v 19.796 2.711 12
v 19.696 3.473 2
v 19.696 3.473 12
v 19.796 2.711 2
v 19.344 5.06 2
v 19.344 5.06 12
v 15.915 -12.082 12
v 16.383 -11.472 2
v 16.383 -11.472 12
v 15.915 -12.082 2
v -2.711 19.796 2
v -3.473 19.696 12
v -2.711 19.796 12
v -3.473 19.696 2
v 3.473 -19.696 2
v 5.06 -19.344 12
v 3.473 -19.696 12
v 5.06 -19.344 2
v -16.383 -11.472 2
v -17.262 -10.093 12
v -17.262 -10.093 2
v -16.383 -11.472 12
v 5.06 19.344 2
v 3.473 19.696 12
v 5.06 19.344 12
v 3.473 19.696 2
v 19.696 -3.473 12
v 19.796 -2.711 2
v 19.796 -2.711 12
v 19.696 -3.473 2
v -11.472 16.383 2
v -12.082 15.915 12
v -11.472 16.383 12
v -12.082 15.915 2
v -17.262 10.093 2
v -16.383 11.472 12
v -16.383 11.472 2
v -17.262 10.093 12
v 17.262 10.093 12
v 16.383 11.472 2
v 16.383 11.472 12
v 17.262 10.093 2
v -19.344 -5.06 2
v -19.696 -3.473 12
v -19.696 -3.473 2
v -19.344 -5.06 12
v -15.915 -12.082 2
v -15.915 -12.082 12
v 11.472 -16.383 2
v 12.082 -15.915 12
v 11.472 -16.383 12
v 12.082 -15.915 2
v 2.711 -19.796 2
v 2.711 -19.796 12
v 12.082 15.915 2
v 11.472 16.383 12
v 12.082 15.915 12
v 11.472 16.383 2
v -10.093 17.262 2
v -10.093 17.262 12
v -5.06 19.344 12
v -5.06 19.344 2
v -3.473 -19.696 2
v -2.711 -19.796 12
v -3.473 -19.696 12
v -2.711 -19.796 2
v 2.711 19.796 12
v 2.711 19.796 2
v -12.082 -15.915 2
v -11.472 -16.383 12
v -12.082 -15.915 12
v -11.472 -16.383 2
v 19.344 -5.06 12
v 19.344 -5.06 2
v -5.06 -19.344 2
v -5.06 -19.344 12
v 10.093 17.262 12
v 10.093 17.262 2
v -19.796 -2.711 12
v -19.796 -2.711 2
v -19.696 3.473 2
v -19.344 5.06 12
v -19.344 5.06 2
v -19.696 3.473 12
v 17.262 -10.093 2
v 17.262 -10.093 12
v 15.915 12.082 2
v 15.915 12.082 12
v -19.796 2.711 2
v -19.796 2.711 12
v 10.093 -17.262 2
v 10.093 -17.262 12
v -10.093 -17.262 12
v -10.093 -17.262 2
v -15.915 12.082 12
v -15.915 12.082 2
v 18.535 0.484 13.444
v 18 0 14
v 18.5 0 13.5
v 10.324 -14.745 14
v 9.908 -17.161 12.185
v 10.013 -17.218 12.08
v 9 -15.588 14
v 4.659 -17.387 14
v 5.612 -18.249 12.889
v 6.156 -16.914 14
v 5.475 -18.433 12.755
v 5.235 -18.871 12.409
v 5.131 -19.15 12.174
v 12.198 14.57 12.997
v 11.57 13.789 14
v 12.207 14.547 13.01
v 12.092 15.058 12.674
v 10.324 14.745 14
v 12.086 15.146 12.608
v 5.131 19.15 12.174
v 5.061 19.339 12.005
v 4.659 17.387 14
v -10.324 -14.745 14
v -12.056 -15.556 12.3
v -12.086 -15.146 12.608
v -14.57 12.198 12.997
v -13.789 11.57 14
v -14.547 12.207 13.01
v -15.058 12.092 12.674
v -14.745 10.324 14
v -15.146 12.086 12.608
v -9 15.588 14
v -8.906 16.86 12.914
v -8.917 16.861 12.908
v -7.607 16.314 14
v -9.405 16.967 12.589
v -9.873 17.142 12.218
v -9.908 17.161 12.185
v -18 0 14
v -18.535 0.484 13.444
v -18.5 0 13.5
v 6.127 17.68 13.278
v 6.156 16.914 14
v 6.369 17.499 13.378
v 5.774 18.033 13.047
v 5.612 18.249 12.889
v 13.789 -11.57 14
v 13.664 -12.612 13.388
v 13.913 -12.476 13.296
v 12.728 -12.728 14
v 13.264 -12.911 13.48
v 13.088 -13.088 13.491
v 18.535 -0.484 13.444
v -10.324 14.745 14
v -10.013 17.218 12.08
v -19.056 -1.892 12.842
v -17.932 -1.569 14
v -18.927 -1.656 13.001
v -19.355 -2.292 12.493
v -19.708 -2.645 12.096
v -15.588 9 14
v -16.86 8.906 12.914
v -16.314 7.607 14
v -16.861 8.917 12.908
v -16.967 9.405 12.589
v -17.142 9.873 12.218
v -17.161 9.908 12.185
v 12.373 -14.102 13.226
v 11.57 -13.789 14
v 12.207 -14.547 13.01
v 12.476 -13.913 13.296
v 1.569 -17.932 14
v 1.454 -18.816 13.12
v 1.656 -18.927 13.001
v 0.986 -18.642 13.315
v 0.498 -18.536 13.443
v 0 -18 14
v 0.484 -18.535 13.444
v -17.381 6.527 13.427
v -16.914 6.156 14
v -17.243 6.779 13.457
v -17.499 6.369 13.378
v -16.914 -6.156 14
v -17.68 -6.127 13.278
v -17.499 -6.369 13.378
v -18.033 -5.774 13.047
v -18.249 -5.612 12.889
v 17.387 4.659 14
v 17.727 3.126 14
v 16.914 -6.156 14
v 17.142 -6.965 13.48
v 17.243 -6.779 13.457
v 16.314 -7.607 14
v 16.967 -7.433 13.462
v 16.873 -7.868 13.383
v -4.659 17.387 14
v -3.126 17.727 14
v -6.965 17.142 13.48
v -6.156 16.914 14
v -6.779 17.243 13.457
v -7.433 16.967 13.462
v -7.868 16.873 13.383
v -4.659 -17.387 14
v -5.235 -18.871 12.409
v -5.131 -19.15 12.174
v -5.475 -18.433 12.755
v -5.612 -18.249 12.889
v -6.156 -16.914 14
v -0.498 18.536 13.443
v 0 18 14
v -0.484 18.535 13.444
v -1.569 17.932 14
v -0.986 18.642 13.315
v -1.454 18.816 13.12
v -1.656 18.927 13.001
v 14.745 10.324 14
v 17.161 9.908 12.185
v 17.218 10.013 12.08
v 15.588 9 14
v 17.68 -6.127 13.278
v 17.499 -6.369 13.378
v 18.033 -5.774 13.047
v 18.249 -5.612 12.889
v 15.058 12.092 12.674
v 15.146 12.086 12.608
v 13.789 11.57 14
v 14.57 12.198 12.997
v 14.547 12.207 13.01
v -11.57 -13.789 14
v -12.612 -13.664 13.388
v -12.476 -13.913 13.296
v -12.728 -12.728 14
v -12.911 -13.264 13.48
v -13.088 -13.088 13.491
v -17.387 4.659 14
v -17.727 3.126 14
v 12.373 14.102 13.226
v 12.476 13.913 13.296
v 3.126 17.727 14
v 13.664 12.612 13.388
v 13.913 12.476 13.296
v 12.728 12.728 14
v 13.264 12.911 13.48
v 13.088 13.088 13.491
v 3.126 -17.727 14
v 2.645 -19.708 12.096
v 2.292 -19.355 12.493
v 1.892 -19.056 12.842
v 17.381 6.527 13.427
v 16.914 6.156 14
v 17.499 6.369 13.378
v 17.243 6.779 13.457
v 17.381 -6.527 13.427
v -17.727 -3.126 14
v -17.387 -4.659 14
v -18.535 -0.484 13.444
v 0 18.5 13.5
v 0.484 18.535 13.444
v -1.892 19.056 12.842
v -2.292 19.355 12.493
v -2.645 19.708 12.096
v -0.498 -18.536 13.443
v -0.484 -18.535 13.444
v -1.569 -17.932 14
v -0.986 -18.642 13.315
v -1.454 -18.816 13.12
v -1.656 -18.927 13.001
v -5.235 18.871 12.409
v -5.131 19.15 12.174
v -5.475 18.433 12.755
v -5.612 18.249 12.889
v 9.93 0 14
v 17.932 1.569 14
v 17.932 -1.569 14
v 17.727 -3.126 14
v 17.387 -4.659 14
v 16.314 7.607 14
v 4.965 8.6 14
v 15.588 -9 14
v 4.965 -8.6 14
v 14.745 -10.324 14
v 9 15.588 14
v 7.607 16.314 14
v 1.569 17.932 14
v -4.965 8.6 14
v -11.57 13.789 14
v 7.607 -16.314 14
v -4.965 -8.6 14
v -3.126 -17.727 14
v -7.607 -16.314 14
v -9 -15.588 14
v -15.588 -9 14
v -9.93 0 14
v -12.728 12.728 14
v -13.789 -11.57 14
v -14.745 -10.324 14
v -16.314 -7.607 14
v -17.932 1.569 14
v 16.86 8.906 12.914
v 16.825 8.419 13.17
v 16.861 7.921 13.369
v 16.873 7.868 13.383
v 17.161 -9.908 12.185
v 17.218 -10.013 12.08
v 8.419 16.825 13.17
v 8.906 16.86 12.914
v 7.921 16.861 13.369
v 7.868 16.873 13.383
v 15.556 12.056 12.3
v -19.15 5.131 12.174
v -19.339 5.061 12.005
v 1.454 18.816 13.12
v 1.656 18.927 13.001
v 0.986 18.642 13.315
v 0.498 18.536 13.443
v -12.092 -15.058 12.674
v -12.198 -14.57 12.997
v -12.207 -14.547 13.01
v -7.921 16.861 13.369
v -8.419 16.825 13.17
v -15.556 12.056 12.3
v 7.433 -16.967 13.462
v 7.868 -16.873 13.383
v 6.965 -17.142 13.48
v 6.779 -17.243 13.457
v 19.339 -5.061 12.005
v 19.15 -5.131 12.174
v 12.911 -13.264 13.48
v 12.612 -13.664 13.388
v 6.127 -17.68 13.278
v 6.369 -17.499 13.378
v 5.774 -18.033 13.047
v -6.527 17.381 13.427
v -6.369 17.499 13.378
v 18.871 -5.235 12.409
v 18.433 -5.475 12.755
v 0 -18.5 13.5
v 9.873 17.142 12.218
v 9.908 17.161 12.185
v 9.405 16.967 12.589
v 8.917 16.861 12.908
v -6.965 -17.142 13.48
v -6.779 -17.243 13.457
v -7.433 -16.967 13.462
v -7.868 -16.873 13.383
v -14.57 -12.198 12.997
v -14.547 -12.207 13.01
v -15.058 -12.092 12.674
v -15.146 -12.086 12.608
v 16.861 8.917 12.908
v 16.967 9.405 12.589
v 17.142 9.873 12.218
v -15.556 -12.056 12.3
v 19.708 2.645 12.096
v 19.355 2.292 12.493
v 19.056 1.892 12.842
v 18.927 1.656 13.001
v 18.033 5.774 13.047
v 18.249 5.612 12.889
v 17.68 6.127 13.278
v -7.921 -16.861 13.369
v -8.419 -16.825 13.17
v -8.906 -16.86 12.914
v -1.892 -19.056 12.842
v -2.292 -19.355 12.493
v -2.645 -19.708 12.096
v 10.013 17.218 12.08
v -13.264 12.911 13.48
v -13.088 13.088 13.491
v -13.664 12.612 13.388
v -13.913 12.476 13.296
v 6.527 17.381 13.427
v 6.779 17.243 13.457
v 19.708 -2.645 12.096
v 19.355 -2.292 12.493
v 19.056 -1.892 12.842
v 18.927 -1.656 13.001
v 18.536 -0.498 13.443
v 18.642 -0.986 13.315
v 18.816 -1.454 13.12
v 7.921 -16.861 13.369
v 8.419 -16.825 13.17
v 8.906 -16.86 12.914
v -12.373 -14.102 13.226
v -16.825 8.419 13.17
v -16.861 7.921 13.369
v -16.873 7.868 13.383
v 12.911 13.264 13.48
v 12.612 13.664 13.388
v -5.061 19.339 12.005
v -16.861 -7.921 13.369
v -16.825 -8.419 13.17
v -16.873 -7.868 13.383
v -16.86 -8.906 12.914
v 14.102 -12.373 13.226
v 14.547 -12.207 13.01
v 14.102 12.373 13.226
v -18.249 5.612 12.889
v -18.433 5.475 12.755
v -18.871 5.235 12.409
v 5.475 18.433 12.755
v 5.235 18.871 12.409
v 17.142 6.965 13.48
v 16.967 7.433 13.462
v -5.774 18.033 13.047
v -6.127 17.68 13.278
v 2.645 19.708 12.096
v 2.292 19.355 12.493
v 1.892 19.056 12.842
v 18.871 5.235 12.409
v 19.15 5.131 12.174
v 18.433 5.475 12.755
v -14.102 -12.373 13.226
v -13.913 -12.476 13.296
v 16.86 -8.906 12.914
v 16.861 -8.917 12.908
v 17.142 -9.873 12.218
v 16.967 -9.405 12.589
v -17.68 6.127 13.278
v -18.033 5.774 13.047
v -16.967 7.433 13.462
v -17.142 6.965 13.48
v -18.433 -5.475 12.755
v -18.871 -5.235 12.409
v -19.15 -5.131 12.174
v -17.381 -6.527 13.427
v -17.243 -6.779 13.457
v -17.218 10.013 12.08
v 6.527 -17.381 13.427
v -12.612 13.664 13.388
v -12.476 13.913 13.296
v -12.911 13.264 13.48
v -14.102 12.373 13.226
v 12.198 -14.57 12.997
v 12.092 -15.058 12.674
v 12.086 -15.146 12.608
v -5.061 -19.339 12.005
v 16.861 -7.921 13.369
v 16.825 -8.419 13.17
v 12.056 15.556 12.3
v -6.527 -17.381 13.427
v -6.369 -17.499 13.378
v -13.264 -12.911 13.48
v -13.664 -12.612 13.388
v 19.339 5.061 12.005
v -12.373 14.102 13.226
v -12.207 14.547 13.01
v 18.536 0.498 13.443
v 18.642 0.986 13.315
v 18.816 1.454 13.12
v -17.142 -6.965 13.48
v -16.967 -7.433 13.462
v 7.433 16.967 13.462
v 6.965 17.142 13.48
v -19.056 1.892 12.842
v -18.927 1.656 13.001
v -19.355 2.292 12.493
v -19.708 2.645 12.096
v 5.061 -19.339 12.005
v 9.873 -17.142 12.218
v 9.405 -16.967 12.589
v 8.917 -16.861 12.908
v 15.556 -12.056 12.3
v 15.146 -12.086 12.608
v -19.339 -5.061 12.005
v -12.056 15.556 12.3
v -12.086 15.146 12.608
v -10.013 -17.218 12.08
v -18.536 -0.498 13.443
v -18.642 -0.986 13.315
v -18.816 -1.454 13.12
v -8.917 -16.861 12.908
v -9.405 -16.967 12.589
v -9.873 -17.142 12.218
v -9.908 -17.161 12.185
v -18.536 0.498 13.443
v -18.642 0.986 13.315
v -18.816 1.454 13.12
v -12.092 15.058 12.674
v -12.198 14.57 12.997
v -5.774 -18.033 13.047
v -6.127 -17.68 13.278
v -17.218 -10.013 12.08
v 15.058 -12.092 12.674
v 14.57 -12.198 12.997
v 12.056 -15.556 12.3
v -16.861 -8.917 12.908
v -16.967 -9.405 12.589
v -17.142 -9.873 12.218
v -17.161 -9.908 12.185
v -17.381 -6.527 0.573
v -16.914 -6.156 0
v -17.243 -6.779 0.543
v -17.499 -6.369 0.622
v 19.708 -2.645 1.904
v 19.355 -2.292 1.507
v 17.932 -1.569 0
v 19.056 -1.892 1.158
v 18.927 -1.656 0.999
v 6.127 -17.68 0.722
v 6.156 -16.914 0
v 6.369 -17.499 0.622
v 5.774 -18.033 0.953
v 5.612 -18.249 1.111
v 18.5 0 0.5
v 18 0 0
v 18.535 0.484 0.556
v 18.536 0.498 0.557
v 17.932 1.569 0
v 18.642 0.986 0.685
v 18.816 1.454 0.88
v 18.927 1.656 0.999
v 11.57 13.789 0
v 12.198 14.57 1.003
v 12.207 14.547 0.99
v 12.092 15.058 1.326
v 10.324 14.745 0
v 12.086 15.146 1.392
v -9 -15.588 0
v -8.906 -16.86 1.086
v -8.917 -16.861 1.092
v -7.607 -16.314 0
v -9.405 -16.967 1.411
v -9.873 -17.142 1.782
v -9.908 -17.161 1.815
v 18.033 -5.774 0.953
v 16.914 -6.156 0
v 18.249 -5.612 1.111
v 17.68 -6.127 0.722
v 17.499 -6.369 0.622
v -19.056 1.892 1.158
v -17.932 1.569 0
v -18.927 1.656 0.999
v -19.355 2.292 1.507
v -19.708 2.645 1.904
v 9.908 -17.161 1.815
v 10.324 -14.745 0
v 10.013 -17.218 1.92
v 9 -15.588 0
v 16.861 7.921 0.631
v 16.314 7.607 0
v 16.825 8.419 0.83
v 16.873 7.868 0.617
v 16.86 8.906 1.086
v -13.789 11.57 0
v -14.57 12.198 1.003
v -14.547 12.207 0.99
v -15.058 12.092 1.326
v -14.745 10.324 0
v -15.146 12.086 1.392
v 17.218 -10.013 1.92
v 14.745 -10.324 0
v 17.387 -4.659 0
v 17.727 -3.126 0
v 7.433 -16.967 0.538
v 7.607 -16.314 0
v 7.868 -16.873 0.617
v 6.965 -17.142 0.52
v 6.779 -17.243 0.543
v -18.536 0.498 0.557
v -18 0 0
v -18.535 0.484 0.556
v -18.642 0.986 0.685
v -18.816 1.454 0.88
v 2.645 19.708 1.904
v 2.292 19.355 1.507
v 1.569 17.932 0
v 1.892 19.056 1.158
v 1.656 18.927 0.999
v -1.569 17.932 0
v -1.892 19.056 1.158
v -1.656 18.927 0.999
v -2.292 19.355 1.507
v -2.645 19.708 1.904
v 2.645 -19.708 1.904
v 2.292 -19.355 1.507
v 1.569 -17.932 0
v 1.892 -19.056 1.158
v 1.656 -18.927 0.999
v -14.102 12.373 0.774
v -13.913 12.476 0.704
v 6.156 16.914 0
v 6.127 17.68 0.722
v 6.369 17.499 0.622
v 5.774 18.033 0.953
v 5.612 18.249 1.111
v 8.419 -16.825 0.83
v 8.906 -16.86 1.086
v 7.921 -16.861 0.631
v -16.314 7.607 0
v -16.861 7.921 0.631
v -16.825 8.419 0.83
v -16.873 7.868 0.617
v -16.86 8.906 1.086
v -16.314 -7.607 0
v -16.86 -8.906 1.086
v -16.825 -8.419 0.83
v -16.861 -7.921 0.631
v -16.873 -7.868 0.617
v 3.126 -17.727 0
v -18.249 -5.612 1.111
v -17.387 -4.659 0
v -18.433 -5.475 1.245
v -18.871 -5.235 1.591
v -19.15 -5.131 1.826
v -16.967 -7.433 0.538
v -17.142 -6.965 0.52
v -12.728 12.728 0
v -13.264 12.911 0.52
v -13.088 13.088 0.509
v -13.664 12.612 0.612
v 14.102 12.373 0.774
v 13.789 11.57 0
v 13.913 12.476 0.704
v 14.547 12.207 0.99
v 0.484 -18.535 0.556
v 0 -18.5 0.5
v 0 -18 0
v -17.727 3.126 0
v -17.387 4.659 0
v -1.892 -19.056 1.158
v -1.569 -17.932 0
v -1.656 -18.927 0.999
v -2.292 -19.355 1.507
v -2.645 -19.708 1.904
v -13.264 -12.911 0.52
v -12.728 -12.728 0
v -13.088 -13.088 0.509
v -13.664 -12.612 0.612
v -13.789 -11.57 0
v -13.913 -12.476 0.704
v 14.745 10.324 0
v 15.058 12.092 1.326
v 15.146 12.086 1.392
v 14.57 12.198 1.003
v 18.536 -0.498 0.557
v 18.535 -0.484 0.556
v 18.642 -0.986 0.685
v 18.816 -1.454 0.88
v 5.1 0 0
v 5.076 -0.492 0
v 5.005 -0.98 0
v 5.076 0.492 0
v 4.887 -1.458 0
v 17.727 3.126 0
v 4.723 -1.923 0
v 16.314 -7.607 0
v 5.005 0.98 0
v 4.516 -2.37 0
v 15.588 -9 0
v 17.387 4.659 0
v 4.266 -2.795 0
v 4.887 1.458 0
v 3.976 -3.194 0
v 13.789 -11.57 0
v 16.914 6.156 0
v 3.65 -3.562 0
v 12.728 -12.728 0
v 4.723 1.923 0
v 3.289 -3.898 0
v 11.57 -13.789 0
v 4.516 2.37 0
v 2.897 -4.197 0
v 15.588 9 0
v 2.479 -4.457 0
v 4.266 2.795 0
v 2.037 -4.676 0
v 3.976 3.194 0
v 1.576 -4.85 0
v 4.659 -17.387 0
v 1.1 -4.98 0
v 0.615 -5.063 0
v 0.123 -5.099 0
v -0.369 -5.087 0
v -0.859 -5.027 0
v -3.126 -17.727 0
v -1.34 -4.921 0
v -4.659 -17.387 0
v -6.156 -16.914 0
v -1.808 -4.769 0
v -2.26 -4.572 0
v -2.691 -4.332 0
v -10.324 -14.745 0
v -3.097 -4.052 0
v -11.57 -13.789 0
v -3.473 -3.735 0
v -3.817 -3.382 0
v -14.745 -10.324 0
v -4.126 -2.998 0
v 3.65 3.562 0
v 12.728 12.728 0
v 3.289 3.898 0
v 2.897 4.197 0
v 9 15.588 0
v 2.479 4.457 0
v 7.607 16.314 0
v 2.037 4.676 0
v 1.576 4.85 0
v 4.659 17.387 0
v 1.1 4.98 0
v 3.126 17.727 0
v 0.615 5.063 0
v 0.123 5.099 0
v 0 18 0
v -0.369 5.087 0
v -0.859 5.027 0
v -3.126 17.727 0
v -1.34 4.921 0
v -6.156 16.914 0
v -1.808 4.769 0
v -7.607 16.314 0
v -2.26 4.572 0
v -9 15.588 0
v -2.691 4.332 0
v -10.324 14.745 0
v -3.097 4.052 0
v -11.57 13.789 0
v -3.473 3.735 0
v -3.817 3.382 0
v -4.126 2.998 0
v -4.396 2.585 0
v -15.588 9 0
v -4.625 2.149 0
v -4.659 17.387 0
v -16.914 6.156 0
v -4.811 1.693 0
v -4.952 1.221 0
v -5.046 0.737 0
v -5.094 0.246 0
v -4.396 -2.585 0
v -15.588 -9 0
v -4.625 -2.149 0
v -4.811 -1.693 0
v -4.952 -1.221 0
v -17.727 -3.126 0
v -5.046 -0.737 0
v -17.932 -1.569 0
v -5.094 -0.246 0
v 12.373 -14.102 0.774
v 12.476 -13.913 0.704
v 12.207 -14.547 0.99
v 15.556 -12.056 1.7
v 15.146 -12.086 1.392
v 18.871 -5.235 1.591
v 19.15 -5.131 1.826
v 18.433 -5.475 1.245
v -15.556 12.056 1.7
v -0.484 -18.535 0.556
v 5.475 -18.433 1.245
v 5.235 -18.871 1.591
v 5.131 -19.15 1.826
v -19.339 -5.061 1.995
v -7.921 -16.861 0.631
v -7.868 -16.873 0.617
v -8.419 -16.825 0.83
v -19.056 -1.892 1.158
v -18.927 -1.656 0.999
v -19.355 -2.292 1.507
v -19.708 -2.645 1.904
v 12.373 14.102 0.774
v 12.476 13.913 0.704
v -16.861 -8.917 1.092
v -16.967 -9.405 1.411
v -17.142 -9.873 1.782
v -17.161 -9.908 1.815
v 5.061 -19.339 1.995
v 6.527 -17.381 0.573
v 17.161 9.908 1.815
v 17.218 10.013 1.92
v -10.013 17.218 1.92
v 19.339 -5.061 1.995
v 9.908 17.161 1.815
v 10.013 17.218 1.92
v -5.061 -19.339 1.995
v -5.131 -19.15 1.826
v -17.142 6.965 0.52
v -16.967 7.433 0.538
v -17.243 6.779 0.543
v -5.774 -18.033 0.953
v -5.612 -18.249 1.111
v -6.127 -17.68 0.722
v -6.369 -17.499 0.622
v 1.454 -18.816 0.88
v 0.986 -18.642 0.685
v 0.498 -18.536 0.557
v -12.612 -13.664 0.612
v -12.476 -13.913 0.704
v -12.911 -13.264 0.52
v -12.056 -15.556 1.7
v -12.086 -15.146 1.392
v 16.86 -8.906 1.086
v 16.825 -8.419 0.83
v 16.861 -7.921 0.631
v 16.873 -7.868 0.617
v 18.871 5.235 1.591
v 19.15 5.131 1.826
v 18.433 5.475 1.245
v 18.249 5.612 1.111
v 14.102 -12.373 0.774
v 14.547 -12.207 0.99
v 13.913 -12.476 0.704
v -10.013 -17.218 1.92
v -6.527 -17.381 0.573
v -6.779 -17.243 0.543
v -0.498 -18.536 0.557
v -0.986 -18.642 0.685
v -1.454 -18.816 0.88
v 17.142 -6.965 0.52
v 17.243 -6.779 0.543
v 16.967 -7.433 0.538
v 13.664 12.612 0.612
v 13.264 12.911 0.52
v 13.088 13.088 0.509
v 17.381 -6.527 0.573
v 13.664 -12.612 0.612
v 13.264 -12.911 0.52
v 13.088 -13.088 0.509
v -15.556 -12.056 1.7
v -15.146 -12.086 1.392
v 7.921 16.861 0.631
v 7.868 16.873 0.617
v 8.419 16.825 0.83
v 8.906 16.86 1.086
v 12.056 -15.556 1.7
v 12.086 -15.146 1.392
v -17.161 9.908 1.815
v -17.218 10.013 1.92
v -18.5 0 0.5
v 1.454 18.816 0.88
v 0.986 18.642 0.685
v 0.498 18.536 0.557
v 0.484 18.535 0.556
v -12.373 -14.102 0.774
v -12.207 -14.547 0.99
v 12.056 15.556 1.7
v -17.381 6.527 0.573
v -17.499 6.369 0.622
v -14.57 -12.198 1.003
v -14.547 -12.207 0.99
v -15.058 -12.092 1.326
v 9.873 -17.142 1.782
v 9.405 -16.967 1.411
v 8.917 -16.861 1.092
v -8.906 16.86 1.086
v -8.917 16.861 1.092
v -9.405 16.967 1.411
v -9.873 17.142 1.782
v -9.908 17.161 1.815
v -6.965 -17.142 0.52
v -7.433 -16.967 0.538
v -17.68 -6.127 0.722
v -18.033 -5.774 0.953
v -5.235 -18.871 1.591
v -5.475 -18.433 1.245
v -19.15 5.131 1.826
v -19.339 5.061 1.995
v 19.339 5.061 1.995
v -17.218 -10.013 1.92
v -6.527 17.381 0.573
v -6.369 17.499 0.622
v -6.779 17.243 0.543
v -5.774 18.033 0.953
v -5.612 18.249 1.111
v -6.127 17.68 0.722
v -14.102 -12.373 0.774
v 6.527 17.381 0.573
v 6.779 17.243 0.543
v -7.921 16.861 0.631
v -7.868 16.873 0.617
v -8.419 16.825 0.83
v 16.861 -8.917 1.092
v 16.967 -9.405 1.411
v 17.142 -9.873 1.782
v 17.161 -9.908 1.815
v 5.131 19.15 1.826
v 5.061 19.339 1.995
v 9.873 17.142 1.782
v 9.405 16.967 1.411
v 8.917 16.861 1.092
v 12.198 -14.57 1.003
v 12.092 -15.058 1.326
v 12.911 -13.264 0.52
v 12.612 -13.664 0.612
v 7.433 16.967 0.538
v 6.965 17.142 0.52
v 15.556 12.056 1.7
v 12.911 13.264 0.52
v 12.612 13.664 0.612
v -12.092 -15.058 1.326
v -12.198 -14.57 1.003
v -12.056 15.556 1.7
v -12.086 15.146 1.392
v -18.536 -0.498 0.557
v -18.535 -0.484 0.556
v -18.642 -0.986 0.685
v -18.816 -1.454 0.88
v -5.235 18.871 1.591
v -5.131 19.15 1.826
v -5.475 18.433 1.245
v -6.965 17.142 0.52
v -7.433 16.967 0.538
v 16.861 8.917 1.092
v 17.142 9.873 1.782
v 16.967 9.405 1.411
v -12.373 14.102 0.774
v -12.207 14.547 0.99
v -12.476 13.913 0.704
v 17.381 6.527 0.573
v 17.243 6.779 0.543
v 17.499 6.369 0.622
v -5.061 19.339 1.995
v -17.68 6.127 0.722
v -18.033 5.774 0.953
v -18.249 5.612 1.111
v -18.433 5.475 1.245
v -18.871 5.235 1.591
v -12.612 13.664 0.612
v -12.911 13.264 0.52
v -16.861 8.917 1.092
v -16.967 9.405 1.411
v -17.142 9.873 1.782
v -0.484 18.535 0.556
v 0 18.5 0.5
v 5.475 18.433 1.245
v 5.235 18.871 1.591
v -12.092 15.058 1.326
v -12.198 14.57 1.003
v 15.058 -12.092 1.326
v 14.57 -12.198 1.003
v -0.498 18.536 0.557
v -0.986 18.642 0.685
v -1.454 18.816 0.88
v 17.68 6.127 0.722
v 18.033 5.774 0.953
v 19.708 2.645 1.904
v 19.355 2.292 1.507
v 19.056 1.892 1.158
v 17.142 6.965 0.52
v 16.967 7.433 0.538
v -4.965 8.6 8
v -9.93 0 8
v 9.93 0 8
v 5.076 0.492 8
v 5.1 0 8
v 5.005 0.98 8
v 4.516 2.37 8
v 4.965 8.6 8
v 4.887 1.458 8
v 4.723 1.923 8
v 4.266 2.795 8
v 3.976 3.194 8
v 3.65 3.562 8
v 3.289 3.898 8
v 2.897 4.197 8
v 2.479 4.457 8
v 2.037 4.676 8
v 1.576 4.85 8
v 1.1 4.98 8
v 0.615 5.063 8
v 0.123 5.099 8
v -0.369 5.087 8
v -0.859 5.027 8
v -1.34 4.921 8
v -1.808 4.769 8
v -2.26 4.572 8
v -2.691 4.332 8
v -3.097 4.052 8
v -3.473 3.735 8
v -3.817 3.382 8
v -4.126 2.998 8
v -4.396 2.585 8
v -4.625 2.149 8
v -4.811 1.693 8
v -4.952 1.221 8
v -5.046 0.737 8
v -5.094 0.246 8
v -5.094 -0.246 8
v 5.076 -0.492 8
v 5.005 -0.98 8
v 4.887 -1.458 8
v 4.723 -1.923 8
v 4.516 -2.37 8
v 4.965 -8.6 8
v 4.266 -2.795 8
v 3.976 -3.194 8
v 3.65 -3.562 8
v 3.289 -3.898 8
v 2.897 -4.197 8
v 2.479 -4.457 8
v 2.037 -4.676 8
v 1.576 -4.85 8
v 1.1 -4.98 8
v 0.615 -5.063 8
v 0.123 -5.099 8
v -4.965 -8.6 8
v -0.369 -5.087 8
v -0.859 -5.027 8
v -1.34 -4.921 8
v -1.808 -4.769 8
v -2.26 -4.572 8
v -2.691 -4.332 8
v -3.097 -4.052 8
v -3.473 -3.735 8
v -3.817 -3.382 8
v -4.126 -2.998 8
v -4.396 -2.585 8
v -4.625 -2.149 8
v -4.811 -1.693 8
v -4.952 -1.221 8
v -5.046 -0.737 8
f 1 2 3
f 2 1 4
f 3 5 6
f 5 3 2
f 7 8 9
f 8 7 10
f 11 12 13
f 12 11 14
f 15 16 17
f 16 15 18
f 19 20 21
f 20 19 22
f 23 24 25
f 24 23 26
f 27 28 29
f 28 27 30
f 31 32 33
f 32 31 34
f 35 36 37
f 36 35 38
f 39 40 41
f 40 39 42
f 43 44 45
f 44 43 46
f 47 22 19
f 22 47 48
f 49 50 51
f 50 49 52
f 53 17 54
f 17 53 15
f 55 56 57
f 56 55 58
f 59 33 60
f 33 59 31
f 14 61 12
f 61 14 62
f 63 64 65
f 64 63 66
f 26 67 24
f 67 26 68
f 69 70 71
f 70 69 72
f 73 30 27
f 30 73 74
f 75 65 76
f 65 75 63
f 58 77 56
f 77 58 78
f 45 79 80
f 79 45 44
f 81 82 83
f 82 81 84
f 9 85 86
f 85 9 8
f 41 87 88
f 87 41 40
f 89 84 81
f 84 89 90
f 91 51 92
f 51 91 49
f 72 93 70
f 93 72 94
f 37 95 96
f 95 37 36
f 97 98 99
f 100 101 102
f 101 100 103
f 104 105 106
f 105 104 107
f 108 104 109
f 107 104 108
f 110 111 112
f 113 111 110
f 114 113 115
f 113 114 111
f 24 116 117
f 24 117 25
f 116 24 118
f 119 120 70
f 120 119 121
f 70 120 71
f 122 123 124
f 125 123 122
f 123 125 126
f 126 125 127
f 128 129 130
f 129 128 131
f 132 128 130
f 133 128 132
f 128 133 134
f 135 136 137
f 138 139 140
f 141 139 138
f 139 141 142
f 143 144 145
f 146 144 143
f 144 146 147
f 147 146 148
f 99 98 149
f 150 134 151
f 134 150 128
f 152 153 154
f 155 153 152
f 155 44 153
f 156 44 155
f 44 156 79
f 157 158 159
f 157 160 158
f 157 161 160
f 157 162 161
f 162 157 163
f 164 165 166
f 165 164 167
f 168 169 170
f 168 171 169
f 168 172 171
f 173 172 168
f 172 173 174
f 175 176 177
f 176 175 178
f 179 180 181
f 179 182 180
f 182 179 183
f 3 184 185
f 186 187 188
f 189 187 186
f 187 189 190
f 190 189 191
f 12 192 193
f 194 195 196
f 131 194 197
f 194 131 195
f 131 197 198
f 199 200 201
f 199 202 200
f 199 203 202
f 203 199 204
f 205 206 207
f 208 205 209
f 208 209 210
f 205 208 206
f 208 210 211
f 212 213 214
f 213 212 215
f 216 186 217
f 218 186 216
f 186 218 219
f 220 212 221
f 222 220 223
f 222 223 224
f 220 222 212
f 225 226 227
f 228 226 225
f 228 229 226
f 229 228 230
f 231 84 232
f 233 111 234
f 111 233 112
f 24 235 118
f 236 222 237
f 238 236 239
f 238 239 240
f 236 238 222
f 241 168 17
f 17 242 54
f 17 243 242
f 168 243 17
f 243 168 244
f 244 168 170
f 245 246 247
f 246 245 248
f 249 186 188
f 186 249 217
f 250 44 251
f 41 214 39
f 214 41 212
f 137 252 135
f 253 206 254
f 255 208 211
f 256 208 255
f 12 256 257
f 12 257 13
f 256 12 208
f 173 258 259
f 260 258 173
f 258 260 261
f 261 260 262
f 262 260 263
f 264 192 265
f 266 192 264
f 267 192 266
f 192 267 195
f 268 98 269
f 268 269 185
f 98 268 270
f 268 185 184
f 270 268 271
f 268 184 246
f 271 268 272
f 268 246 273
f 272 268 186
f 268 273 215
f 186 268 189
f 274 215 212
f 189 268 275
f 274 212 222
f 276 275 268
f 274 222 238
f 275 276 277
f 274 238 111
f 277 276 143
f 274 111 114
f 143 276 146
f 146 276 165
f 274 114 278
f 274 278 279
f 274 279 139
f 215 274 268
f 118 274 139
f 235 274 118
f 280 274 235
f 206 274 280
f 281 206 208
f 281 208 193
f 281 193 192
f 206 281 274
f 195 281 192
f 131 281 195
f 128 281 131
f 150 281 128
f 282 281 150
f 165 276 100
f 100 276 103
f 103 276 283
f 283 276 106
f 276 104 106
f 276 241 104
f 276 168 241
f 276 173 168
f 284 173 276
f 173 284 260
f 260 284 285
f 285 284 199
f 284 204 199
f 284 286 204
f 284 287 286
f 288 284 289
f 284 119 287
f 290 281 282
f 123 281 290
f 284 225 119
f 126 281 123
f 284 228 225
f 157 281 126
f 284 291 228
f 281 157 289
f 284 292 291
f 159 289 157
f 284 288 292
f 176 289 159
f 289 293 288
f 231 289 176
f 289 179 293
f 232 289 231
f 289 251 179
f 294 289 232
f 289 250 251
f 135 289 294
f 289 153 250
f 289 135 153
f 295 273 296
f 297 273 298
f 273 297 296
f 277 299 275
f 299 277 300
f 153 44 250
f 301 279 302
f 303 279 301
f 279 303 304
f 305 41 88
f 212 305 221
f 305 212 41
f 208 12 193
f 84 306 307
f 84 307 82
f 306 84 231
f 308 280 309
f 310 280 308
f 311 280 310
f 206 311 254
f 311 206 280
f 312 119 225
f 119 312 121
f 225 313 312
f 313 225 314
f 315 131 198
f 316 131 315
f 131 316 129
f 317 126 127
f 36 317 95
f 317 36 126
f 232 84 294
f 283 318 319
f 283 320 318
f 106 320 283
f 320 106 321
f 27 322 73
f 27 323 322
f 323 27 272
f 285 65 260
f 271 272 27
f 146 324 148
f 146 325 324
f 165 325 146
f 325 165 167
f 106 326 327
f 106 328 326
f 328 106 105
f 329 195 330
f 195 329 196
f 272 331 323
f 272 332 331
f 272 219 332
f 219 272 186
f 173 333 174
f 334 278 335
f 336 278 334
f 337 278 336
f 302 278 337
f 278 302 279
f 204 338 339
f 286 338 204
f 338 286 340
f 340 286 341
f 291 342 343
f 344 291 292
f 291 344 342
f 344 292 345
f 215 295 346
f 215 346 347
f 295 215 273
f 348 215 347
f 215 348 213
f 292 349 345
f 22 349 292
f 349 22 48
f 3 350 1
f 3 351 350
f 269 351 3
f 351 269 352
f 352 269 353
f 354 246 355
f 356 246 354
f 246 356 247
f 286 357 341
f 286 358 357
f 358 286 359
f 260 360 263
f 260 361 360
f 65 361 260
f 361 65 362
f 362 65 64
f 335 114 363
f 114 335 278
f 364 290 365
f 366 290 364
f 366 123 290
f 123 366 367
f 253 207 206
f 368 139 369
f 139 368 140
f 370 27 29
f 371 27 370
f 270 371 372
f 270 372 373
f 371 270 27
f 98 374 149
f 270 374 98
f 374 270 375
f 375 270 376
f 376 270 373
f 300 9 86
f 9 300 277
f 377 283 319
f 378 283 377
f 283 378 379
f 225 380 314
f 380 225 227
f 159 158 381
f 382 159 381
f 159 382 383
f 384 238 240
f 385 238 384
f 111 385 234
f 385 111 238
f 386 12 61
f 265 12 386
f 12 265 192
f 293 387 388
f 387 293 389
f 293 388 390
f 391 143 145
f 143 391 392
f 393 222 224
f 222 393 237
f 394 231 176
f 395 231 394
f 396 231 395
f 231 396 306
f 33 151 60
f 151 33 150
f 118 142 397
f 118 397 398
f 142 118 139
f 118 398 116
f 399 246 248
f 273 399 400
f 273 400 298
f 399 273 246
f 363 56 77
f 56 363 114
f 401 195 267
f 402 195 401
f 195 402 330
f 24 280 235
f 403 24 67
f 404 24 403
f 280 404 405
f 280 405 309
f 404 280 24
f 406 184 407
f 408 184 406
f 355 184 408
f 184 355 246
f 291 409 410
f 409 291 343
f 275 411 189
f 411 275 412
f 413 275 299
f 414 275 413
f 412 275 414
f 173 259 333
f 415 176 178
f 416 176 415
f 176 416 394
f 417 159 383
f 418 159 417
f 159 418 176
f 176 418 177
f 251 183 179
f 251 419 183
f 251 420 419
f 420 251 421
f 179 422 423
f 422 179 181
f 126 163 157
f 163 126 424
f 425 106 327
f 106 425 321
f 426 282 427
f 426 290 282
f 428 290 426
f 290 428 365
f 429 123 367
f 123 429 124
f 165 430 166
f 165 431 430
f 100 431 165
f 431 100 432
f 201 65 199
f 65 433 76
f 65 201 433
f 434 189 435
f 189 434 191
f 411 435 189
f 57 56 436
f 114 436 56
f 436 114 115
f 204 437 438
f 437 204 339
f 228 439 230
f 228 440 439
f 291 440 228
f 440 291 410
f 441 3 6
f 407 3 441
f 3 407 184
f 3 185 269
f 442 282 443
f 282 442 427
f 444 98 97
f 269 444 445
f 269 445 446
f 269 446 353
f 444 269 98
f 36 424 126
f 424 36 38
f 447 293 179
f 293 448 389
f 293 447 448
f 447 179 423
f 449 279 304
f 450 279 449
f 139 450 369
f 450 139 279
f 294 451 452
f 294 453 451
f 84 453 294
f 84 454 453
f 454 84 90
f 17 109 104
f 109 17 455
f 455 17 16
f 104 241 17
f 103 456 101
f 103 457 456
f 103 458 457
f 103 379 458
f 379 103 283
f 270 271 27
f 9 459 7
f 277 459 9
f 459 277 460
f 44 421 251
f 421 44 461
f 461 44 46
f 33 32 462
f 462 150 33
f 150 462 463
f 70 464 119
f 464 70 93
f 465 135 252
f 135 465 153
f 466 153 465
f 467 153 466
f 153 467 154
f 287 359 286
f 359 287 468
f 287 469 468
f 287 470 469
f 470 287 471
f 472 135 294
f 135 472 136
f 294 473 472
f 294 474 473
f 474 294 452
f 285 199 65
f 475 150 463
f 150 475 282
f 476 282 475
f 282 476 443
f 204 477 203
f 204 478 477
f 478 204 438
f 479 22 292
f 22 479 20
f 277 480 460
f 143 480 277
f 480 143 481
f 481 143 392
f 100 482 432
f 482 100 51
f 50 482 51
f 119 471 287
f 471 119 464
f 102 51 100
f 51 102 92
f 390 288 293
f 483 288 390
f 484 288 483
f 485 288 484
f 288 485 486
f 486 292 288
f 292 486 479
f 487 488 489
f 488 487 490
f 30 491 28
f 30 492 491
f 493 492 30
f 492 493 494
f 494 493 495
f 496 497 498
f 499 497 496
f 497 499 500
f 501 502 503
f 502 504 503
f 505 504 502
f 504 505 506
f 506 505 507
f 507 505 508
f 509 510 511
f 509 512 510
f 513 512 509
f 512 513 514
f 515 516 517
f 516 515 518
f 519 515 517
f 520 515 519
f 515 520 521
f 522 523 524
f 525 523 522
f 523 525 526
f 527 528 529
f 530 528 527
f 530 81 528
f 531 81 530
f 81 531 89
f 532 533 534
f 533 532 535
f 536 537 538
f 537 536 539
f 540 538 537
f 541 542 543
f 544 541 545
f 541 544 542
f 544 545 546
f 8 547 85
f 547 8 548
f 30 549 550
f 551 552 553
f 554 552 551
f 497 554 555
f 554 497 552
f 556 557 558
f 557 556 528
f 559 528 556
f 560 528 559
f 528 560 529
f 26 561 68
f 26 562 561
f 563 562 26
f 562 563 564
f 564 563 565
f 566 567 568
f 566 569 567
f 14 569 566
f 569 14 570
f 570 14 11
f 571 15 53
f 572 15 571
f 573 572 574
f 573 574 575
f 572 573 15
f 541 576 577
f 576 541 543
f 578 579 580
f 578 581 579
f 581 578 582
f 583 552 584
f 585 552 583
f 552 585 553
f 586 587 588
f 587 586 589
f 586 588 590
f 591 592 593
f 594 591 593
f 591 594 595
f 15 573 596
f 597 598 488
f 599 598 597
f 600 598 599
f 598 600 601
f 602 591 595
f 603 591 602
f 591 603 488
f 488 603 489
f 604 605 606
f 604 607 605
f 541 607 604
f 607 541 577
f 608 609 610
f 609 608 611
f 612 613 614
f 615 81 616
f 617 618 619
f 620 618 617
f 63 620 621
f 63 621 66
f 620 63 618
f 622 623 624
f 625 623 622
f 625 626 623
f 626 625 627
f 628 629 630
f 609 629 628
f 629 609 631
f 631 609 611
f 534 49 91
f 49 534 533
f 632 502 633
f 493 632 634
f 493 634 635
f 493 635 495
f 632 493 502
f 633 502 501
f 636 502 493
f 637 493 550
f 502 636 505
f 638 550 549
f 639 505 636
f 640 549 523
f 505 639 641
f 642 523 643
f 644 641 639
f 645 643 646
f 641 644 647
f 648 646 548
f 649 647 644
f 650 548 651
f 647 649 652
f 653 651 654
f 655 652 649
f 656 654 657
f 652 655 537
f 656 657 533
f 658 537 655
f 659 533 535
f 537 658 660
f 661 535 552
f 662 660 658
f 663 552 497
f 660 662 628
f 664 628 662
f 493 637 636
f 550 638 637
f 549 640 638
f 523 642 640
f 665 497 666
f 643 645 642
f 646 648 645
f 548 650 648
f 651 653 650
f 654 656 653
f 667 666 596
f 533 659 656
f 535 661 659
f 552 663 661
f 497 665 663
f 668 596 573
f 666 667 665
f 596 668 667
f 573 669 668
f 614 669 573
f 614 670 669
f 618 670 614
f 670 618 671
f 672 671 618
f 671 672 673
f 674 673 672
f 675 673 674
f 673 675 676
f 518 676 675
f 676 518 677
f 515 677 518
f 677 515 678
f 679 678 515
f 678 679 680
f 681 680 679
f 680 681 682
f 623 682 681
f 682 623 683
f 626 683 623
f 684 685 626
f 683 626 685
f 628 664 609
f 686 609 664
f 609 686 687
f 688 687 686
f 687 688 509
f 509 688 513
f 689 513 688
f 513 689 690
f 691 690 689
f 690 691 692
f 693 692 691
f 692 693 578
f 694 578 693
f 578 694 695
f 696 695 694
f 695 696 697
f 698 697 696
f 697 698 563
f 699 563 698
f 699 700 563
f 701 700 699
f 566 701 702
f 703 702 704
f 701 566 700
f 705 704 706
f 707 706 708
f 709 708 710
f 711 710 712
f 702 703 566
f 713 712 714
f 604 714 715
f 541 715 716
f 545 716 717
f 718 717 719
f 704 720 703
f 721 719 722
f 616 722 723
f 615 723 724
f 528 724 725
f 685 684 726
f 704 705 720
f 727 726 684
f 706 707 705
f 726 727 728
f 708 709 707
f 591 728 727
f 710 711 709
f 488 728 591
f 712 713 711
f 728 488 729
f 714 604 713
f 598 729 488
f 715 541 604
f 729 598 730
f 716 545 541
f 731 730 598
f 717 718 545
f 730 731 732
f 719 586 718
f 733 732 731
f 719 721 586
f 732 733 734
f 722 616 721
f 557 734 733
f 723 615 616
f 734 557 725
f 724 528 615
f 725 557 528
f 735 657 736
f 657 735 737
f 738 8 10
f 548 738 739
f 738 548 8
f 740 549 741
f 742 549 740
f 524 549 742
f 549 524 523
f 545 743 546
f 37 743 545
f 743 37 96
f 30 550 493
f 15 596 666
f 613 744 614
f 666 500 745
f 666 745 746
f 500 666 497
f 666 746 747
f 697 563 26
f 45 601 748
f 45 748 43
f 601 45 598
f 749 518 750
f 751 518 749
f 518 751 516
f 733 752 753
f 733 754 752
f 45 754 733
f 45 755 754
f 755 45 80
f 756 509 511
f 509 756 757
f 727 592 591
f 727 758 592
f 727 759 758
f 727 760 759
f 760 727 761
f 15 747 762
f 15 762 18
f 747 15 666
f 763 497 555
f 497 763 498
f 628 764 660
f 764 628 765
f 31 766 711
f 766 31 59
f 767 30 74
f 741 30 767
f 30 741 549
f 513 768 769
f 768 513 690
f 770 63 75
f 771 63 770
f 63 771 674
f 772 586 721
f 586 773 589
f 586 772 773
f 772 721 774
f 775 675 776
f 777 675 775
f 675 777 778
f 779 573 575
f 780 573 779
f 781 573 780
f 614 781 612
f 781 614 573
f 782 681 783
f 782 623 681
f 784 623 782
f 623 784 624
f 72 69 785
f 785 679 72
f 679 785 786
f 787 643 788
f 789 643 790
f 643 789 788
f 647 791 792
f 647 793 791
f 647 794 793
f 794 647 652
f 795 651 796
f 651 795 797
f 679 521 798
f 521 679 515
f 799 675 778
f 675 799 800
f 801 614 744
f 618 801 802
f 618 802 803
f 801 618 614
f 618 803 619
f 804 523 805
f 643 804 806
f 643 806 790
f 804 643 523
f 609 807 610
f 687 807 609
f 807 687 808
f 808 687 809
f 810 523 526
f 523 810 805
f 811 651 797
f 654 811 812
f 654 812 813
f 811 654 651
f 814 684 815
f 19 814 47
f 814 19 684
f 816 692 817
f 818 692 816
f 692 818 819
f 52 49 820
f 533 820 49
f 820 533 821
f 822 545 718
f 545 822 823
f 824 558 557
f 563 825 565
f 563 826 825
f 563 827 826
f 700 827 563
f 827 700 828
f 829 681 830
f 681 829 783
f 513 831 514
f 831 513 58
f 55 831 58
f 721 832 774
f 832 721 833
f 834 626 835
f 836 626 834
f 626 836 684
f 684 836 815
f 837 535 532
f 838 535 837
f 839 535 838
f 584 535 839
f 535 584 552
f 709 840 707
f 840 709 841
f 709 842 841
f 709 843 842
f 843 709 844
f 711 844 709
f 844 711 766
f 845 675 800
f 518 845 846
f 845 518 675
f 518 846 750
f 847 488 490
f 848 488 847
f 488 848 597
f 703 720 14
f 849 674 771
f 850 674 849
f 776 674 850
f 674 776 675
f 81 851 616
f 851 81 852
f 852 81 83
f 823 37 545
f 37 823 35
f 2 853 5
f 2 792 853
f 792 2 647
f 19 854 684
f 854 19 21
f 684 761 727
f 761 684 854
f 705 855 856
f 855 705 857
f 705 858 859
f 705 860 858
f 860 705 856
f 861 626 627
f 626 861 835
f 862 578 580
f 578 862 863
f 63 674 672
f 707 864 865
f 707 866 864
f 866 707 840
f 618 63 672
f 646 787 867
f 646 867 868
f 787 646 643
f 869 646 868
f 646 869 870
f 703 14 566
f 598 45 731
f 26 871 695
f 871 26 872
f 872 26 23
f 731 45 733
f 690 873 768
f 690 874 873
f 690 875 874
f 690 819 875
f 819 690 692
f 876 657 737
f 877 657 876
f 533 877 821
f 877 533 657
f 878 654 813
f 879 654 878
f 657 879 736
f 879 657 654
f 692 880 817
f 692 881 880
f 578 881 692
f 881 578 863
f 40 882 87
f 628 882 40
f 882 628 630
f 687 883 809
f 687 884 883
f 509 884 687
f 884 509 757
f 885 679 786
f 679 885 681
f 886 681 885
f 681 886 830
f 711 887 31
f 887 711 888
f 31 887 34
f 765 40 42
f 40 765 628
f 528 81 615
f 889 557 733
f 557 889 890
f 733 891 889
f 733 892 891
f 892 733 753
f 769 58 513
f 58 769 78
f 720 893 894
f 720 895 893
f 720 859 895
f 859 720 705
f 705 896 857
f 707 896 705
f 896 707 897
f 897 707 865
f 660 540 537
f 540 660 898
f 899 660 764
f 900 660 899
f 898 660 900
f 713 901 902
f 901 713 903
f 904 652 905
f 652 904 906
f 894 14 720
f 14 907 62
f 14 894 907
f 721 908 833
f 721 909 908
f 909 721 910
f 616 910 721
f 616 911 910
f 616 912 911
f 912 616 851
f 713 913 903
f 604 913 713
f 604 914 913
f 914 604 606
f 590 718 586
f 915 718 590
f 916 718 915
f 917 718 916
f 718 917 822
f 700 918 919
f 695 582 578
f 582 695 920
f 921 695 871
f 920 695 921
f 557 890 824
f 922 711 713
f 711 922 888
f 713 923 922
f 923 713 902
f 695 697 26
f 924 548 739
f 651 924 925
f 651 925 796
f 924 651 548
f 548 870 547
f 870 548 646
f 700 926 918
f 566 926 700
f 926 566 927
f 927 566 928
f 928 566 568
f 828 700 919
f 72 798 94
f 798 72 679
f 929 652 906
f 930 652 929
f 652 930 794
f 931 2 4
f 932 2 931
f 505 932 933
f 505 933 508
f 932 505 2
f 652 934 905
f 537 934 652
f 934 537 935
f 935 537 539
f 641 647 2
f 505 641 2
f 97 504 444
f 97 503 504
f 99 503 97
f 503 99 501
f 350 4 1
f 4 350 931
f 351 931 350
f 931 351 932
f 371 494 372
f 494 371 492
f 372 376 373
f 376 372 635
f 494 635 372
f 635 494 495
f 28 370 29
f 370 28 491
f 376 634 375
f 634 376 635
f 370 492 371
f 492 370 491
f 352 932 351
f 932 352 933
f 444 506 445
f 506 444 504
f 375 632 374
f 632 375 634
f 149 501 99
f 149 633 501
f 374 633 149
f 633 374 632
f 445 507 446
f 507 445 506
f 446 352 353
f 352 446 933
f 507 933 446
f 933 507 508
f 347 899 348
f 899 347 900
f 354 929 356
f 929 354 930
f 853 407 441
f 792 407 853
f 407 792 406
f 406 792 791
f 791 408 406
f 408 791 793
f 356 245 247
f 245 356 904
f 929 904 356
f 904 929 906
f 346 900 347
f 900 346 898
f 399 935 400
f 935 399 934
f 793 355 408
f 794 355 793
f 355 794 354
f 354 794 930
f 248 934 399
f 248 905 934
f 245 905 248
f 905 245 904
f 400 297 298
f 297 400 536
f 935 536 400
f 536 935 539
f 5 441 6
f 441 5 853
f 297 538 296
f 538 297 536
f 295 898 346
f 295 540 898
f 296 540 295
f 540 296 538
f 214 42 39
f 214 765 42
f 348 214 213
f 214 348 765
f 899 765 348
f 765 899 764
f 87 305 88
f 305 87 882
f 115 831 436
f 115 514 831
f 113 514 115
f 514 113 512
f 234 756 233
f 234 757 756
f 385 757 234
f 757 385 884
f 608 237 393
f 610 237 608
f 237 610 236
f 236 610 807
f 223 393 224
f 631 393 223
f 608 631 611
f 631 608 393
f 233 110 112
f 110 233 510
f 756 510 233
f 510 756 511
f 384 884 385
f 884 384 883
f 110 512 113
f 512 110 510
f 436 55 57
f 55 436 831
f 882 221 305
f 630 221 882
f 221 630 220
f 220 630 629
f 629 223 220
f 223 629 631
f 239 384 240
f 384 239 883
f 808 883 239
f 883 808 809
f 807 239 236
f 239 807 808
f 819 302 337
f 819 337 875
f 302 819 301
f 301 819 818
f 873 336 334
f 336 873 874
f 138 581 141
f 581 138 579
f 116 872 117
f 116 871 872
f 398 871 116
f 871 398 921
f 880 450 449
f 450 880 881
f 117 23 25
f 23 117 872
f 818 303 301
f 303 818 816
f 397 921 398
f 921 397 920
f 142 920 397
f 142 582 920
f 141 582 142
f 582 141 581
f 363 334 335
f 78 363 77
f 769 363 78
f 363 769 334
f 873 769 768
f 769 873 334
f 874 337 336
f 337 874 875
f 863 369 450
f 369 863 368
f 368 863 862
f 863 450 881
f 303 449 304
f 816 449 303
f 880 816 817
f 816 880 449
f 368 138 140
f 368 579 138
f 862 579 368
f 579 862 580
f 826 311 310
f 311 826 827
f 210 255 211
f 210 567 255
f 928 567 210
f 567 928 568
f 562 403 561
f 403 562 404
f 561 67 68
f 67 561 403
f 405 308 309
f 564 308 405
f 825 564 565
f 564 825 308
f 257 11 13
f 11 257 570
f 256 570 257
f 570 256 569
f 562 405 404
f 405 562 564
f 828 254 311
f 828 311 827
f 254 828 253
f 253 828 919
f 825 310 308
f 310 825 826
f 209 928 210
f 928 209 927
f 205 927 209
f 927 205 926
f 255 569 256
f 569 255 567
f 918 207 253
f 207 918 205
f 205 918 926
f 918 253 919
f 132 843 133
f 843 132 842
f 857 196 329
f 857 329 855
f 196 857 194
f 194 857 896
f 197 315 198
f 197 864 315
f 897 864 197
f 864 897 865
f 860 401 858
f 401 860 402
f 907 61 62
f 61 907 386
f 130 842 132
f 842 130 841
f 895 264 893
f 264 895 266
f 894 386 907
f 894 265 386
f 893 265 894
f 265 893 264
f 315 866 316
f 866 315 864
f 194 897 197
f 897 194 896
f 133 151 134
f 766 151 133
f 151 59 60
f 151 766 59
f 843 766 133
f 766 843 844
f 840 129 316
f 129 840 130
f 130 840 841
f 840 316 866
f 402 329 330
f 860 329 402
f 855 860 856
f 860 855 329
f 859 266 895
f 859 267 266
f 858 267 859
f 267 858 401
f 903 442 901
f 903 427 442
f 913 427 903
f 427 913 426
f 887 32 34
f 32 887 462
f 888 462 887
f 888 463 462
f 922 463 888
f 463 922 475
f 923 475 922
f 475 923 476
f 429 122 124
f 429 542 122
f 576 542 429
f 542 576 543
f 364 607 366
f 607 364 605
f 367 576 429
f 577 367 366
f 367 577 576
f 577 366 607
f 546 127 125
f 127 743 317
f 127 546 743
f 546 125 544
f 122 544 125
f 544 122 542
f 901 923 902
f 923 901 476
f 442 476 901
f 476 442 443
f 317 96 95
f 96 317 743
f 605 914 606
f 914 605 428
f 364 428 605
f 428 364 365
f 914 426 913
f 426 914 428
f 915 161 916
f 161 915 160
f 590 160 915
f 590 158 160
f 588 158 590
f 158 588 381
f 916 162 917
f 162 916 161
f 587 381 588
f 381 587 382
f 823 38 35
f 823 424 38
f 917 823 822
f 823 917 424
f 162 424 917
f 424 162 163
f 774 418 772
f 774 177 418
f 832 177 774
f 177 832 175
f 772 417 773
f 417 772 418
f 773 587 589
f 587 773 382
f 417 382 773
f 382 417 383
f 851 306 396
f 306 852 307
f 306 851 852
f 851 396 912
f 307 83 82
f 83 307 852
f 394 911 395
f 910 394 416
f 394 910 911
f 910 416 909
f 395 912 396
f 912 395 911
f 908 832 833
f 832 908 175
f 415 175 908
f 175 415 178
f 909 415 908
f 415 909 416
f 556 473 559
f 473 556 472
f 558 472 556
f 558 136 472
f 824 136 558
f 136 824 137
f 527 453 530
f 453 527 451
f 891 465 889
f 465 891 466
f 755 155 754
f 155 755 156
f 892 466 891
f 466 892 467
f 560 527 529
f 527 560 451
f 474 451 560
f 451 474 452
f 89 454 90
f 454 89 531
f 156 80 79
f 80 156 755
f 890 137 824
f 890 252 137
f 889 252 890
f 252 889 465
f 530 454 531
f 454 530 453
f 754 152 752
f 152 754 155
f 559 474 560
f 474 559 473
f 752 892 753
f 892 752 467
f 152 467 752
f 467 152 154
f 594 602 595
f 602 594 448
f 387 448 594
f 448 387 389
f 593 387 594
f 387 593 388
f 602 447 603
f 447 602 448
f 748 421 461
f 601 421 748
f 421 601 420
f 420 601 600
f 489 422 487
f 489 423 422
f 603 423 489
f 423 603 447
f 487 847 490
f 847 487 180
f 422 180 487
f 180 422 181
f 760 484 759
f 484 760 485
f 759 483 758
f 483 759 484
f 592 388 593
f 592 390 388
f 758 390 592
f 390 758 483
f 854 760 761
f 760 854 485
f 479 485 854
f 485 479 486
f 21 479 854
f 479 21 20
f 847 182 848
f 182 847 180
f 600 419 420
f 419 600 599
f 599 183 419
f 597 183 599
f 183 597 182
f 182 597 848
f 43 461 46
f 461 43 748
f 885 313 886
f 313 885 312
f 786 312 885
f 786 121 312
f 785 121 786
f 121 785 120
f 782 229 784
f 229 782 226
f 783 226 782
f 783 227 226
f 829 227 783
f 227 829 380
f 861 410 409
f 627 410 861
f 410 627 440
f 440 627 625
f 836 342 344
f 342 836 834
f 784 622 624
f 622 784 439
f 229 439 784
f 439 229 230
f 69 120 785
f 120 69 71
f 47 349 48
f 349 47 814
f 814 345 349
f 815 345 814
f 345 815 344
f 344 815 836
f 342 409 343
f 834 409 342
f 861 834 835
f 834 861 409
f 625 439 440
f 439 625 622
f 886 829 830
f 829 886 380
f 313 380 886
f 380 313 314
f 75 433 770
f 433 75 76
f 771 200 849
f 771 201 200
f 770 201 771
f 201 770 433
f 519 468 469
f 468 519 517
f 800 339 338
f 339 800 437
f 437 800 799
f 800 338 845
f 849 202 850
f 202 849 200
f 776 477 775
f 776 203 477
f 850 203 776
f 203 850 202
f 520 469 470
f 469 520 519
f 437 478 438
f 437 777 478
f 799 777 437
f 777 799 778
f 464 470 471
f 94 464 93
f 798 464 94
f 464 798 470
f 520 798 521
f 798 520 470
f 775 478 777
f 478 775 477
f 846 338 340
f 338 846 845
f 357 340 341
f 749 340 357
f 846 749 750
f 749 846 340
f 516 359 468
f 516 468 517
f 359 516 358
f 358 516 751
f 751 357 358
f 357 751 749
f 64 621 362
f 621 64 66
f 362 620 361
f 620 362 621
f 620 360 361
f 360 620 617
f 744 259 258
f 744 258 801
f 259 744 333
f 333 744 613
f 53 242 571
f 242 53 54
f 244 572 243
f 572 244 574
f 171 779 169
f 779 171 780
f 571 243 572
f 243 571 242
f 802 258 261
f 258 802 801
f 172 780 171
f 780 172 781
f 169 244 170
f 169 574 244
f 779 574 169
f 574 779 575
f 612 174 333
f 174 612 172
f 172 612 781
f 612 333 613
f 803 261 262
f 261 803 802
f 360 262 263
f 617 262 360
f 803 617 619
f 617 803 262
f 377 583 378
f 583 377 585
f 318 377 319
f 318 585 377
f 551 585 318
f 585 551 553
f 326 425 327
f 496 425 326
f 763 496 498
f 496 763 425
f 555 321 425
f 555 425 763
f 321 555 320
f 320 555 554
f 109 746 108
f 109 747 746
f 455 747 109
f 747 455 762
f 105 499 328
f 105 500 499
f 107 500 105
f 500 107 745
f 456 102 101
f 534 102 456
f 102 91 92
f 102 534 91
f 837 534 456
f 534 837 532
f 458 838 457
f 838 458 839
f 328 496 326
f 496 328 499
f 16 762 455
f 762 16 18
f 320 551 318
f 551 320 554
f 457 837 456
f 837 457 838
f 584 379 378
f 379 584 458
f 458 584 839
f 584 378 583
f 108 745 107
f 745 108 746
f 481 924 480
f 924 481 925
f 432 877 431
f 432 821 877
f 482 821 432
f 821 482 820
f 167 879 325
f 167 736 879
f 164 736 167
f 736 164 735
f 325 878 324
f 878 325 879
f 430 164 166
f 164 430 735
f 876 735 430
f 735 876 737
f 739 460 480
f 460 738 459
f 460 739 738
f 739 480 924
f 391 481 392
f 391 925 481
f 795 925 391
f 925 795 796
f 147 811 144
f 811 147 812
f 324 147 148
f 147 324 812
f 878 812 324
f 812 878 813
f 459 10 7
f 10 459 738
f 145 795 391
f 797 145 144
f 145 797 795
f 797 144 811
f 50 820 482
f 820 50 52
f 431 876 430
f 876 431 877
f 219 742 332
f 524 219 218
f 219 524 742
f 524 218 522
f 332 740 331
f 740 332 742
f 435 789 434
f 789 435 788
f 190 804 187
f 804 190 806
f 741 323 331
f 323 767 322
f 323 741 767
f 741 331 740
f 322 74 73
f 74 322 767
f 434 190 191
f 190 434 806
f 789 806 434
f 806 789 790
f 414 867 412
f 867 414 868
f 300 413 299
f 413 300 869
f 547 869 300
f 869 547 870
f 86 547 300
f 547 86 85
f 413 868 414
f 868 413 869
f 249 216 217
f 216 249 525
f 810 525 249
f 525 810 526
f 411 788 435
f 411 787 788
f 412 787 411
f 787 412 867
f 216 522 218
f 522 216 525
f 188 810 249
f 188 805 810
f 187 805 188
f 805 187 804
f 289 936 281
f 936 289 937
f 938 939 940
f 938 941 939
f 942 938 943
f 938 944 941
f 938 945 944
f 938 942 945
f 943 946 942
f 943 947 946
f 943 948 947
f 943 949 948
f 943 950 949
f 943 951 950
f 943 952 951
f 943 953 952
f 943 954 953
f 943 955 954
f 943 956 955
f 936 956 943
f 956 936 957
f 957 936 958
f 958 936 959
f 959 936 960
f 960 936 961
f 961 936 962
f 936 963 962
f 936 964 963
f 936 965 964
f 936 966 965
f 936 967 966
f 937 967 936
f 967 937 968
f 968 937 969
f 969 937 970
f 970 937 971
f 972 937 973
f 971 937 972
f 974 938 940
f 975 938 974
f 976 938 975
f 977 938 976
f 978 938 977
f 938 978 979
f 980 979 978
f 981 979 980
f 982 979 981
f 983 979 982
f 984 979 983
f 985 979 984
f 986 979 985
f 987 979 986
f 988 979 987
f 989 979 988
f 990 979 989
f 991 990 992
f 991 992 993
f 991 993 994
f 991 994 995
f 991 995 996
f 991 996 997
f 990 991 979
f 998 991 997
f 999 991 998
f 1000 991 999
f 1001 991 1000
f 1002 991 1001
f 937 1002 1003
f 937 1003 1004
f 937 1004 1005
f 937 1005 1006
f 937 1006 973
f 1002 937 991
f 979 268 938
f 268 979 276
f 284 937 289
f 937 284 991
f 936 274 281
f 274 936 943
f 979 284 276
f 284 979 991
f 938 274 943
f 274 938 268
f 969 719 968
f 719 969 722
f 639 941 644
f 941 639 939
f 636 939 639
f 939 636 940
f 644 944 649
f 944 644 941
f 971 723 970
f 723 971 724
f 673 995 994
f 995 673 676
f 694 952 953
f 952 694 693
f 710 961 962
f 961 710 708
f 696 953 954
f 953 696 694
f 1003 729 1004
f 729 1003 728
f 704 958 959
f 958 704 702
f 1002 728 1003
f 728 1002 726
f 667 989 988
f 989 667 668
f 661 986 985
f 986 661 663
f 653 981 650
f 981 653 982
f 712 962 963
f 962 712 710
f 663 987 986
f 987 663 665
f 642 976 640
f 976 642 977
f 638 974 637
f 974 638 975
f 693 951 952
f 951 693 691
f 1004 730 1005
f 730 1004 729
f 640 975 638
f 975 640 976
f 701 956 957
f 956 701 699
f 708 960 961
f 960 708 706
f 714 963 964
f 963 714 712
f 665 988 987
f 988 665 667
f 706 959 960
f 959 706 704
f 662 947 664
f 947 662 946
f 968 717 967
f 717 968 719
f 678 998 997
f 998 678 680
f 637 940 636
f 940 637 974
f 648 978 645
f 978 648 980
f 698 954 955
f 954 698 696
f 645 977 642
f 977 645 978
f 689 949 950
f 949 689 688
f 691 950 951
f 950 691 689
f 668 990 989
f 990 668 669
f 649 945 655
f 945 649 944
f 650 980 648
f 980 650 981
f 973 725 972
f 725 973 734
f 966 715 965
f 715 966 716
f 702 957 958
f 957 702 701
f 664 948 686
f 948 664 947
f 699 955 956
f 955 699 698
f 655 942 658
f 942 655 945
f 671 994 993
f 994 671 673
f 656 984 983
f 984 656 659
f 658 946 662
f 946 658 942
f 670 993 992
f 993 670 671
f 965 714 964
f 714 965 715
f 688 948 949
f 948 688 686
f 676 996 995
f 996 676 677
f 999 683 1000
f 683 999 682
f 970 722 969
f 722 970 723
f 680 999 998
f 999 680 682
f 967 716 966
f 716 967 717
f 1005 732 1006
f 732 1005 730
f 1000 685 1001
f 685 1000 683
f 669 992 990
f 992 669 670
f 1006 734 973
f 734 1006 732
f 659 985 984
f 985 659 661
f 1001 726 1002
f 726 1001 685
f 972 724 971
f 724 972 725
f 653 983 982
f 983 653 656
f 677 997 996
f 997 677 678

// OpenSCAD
// https://makerworld.com/en/models/1104436-customizable-knobs

/* [Knob Parameters] */
Knob_Radius = 20;
Knob_Chamfer = 2; // [0,1,2]
Knob_Height = 14;
Number_of_Grip_Cutouts = 16;
//Usually knob radius + half of the cutout size
Cutout_Radius = 22;
Cutout_Size = 3.5;

/* [Screwhead Parameters] */
Screw_Head_Size = 17;
Screw_Head_Height = 6;
Screw_Head_Offset = 0.2;
Screw_Diameter = 10;
Screw_Diameter_Offset = 0.2;
Screw_Diameter_withoffset = Screw_Diameter_Offset+Screw_Diameter;

radius = (Screw_Head_Offset+Screw_Head_Size) / sqrt(3);

/* [Hidden] */
$fs=.5;
/* [Hidden] */
$fa=5;

module hex_head() {
    linear_extrude(Screw_Head_Height+0.01) {
        polygon(points=[
            [radius, 0],
            [radius/2, radius * sqrt(3)/2],
            [-radius/2, radius * sqrt(3)/2],
            [-radius, 0],
            [-radius/2, -radius * sqrt(3)/2],
            [radius/2, -radius * sqrt(3)/2]
        ]);
    }
}

module knob() {
    translate([0, 0, Knob_Chamfer]) cylinder(h = Knob_Height-2*Knob_Chamfer, r = Knob_Radius);
    translate([0, 0, Knob_Height-Knob_Chamfer])
    cylinder(h = Knob_Chamfer, r1 = Knob_Radius, r2 = Knob_Radius-Knob_Chamfer);
    translate([0, 0, 0])
    cylinder(h = Knob_Chamfer, r1 = Knob_Radius-Knob_Chamfer, r2 = Knob_Radius);
}

difference()  {

    knob();

    translate([0, 0, Knob_Height-Screw_Head_Height])hex_head();

    translate([0, 0, -0.01])cylinder(h = Knob_Height + 0.02, d = Screw_Diameter_withoffset);

    for (i = [0 : Number_of_Grip_Cutouts - 1]) {
        angle = 360 / Number_of_Grip_Cutouts * i;
        x = Cutout_Radius * cos(angle);
        y = Cutout_Radius * sin(angle); 
        translate([x, y, -0.1]) {
            cylinder(h = Knob_Height+4+0.2, r = Cutout_Size);
        }
    }
}
